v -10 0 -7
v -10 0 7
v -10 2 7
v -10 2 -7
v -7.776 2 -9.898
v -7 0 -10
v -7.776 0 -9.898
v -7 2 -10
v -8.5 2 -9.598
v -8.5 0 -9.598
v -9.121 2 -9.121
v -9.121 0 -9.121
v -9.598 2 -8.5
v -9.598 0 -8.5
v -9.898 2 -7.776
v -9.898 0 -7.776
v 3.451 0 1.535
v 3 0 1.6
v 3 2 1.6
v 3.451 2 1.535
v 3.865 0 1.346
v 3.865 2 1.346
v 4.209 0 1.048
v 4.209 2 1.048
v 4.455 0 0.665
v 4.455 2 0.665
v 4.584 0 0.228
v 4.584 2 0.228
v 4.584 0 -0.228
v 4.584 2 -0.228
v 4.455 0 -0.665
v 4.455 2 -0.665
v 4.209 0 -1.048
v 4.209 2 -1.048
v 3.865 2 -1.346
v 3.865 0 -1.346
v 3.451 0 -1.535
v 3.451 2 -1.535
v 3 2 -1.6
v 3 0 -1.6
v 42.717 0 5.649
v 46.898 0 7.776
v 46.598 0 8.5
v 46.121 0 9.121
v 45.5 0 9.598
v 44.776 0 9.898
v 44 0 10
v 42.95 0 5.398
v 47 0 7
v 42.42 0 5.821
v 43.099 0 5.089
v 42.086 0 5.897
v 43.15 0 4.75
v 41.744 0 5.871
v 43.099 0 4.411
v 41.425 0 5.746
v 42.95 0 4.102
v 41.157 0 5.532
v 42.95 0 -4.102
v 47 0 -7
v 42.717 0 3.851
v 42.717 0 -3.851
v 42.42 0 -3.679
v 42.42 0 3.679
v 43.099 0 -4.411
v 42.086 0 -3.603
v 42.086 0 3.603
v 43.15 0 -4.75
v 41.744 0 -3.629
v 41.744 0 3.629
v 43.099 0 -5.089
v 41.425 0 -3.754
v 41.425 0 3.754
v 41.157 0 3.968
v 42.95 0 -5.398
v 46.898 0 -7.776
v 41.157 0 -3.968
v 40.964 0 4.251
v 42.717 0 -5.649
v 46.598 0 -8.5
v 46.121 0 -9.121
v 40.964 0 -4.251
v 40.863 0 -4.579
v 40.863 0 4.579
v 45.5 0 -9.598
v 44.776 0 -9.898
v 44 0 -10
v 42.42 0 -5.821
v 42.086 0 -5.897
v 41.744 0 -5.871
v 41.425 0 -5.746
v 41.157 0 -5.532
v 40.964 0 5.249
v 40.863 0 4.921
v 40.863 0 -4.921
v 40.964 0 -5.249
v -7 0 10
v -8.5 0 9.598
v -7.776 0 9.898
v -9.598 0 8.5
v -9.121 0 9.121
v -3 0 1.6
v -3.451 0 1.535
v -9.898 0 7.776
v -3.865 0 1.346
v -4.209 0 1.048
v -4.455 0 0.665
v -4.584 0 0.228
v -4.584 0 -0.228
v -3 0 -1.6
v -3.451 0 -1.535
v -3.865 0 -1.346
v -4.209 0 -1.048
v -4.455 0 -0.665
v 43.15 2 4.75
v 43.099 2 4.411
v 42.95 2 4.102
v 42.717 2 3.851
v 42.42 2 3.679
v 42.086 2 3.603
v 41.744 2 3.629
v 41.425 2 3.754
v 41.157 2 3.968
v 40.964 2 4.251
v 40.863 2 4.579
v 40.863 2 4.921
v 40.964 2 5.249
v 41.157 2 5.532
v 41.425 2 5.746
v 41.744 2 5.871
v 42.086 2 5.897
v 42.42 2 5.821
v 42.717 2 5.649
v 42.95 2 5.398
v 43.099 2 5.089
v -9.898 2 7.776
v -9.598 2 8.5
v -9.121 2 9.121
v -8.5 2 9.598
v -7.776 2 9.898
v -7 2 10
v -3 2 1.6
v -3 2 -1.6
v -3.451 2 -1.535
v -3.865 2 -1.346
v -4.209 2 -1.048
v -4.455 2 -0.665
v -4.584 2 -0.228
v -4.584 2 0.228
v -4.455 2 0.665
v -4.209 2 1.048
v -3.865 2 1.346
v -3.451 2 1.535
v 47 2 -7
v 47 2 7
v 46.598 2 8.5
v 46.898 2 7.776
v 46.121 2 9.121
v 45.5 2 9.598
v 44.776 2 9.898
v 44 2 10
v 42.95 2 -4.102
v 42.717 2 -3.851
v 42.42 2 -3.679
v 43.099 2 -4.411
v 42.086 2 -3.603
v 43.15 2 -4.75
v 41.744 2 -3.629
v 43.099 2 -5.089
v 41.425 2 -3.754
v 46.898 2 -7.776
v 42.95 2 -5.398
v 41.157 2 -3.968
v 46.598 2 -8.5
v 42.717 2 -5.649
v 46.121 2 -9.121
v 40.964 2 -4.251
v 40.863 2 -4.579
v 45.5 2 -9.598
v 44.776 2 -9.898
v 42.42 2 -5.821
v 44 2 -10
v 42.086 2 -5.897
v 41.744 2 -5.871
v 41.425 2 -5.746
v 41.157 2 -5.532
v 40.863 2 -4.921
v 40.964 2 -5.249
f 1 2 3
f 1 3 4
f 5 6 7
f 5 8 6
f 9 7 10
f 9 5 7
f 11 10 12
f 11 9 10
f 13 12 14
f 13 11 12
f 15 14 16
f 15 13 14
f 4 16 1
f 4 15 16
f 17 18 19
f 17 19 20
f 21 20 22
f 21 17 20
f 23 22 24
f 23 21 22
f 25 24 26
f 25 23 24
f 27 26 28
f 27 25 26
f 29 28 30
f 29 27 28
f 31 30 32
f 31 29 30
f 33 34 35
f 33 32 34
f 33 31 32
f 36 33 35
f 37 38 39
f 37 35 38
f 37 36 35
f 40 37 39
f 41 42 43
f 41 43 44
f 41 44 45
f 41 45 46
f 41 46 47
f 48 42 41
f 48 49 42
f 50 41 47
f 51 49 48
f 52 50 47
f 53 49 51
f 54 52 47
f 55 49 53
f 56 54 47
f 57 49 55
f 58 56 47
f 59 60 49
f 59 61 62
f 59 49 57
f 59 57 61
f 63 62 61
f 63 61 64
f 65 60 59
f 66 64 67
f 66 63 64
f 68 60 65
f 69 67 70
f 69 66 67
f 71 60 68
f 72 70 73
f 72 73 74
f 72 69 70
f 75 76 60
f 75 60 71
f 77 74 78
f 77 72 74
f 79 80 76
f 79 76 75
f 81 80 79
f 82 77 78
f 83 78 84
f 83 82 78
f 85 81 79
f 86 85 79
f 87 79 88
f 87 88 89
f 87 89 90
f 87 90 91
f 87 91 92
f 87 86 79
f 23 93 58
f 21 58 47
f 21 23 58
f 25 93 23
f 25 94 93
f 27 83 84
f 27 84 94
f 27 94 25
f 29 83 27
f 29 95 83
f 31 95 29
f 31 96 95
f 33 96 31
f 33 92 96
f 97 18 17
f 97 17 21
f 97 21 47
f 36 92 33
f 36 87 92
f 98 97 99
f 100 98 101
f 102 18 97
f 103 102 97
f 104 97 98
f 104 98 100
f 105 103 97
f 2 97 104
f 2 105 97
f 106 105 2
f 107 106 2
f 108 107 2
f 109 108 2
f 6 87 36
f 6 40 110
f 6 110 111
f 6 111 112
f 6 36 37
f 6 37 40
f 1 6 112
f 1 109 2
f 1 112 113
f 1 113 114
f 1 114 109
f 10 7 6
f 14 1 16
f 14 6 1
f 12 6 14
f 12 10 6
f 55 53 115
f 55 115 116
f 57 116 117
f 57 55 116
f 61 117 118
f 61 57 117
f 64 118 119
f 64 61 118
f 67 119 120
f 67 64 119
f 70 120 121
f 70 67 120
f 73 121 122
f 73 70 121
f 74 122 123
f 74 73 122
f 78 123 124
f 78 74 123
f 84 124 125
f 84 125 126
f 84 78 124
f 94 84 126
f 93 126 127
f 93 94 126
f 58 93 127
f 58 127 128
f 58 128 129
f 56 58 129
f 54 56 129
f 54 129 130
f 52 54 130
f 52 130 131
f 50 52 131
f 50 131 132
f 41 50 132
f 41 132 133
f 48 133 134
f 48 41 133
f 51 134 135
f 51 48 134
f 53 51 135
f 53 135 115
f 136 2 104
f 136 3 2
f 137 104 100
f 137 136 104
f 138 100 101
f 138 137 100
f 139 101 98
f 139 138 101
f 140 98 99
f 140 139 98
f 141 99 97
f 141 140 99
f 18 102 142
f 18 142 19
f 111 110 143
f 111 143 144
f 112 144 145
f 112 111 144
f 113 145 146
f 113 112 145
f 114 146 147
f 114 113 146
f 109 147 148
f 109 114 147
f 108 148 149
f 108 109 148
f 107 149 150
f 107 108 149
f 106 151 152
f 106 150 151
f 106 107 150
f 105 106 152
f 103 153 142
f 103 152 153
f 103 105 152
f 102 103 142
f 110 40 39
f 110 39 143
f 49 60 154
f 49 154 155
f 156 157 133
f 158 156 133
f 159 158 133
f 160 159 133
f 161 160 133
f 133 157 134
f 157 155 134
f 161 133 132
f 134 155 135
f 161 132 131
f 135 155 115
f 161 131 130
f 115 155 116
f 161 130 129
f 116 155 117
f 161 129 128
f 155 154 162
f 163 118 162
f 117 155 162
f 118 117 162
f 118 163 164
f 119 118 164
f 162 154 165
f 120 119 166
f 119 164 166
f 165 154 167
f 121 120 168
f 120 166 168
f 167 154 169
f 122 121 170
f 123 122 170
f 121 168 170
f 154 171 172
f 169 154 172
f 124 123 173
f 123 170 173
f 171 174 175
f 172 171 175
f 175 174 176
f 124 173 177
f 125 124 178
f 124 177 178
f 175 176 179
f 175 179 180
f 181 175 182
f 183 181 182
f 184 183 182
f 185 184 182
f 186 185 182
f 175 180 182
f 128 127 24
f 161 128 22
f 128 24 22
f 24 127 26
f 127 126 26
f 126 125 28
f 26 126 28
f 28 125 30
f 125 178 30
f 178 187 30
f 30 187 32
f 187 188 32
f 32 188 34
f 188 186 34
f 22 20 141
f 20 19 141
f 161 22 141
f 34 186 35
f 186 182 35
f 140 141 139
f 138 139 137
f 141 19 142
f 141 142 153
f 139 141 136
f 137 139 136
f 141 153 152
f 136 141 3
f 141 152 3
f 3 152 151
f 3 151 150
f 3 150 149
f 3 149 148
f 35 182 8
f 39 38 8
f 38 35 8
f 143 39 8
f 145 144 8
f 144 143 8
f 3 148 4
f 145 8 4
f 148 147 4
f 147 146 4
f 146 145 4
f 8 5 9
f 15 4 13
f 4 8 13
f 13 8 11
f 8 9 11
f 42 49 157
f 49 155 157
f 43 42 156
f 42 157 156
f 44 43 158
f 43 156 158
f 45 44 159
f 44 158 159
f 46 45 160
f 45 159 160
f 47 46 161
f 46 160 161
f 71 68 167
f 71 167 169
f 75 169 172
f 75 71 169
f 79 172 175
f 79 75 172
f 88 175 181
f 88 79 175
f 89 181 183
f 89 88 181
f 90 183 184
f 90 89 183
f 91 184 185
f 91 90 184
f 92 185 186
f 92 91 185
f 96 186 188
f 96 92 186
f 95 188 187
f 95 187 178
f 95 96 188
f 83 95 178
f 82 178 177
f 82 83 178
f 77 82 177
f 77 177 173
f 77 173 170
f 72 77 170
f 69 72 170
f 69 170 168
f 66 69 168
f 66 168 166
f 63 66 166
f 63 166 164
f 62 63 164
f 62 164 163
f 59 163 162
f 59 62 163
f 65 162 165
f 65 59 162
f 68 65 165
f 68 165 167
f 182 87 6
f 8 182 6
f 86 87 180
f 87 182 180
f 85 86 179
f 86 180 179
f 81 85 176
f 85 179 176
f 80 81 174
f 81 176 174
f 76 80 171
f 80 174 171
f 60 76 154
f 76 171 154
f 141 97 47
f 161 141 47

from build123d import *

# Parameters (mm, degrees)
SKETCH_1_R          = 1.6
SKETCH_1_R_2        = 1.15
EXTRUDE_1_DEPTH     = 2
FILLET_2_R          = 3
CUT_EXTRUDE_1_DEPTH = 10


with BuildPart() as part:
    # 草图1 → 凸台-拉伸1 (new body)
    with BuildSketch(Plane(origin=(0, 0, 0), x_dir=(1, 0, 0), z_dir=(0, 1, 0))):
        Polygon((-10, 10), (10, 10), (47, 10), (47, -10), (10, -10), (-10, -10), align=None)
        Circle(SKETCH_1_R, mode=Mode.SUBTRACT)
        with Locations((42, -4.75)):
            Circle(SKETCH_1_R_2, mode=Mode.SUBTRACT)
        with Locations((42, 4.75)):
            Circle(SKETCH_1_R_2, mode=Mode.SUBTRACT)
    extrude(amount=EXTRUDE_1_DEPTH)

    # 圆角2
    fillet_2_edges = [part.edges().sort_by_distance(p)[0] for p in [
        (-10, 1, -10),
        (47, 1, -10),
        (47, 1, 10),
        (-10, 1, 10),
    ]]
    fillet(fillet_2_edges, radius=FILLET_2_R)

    # 草图2 → 切除-拉伸1 (cut)
    with BuildSketch(Plane.XZ):
        with BuildLine():
            Line((-3, 1.6), (3, 1.6))
            ThreePointArc((3, 1.6), (4.6, 0), (3, -1.6))
            Line((3, -1.6), (-3, -1.6))
            ThreePointArc((-3, -1.6), (-4.6, 0), (-3, 1.6))
        make_face()
    extrude(amount=-CUT_EXTRUDE_1_DEPTH, mode=Mode.SUBTRACT)


solid = part.part
